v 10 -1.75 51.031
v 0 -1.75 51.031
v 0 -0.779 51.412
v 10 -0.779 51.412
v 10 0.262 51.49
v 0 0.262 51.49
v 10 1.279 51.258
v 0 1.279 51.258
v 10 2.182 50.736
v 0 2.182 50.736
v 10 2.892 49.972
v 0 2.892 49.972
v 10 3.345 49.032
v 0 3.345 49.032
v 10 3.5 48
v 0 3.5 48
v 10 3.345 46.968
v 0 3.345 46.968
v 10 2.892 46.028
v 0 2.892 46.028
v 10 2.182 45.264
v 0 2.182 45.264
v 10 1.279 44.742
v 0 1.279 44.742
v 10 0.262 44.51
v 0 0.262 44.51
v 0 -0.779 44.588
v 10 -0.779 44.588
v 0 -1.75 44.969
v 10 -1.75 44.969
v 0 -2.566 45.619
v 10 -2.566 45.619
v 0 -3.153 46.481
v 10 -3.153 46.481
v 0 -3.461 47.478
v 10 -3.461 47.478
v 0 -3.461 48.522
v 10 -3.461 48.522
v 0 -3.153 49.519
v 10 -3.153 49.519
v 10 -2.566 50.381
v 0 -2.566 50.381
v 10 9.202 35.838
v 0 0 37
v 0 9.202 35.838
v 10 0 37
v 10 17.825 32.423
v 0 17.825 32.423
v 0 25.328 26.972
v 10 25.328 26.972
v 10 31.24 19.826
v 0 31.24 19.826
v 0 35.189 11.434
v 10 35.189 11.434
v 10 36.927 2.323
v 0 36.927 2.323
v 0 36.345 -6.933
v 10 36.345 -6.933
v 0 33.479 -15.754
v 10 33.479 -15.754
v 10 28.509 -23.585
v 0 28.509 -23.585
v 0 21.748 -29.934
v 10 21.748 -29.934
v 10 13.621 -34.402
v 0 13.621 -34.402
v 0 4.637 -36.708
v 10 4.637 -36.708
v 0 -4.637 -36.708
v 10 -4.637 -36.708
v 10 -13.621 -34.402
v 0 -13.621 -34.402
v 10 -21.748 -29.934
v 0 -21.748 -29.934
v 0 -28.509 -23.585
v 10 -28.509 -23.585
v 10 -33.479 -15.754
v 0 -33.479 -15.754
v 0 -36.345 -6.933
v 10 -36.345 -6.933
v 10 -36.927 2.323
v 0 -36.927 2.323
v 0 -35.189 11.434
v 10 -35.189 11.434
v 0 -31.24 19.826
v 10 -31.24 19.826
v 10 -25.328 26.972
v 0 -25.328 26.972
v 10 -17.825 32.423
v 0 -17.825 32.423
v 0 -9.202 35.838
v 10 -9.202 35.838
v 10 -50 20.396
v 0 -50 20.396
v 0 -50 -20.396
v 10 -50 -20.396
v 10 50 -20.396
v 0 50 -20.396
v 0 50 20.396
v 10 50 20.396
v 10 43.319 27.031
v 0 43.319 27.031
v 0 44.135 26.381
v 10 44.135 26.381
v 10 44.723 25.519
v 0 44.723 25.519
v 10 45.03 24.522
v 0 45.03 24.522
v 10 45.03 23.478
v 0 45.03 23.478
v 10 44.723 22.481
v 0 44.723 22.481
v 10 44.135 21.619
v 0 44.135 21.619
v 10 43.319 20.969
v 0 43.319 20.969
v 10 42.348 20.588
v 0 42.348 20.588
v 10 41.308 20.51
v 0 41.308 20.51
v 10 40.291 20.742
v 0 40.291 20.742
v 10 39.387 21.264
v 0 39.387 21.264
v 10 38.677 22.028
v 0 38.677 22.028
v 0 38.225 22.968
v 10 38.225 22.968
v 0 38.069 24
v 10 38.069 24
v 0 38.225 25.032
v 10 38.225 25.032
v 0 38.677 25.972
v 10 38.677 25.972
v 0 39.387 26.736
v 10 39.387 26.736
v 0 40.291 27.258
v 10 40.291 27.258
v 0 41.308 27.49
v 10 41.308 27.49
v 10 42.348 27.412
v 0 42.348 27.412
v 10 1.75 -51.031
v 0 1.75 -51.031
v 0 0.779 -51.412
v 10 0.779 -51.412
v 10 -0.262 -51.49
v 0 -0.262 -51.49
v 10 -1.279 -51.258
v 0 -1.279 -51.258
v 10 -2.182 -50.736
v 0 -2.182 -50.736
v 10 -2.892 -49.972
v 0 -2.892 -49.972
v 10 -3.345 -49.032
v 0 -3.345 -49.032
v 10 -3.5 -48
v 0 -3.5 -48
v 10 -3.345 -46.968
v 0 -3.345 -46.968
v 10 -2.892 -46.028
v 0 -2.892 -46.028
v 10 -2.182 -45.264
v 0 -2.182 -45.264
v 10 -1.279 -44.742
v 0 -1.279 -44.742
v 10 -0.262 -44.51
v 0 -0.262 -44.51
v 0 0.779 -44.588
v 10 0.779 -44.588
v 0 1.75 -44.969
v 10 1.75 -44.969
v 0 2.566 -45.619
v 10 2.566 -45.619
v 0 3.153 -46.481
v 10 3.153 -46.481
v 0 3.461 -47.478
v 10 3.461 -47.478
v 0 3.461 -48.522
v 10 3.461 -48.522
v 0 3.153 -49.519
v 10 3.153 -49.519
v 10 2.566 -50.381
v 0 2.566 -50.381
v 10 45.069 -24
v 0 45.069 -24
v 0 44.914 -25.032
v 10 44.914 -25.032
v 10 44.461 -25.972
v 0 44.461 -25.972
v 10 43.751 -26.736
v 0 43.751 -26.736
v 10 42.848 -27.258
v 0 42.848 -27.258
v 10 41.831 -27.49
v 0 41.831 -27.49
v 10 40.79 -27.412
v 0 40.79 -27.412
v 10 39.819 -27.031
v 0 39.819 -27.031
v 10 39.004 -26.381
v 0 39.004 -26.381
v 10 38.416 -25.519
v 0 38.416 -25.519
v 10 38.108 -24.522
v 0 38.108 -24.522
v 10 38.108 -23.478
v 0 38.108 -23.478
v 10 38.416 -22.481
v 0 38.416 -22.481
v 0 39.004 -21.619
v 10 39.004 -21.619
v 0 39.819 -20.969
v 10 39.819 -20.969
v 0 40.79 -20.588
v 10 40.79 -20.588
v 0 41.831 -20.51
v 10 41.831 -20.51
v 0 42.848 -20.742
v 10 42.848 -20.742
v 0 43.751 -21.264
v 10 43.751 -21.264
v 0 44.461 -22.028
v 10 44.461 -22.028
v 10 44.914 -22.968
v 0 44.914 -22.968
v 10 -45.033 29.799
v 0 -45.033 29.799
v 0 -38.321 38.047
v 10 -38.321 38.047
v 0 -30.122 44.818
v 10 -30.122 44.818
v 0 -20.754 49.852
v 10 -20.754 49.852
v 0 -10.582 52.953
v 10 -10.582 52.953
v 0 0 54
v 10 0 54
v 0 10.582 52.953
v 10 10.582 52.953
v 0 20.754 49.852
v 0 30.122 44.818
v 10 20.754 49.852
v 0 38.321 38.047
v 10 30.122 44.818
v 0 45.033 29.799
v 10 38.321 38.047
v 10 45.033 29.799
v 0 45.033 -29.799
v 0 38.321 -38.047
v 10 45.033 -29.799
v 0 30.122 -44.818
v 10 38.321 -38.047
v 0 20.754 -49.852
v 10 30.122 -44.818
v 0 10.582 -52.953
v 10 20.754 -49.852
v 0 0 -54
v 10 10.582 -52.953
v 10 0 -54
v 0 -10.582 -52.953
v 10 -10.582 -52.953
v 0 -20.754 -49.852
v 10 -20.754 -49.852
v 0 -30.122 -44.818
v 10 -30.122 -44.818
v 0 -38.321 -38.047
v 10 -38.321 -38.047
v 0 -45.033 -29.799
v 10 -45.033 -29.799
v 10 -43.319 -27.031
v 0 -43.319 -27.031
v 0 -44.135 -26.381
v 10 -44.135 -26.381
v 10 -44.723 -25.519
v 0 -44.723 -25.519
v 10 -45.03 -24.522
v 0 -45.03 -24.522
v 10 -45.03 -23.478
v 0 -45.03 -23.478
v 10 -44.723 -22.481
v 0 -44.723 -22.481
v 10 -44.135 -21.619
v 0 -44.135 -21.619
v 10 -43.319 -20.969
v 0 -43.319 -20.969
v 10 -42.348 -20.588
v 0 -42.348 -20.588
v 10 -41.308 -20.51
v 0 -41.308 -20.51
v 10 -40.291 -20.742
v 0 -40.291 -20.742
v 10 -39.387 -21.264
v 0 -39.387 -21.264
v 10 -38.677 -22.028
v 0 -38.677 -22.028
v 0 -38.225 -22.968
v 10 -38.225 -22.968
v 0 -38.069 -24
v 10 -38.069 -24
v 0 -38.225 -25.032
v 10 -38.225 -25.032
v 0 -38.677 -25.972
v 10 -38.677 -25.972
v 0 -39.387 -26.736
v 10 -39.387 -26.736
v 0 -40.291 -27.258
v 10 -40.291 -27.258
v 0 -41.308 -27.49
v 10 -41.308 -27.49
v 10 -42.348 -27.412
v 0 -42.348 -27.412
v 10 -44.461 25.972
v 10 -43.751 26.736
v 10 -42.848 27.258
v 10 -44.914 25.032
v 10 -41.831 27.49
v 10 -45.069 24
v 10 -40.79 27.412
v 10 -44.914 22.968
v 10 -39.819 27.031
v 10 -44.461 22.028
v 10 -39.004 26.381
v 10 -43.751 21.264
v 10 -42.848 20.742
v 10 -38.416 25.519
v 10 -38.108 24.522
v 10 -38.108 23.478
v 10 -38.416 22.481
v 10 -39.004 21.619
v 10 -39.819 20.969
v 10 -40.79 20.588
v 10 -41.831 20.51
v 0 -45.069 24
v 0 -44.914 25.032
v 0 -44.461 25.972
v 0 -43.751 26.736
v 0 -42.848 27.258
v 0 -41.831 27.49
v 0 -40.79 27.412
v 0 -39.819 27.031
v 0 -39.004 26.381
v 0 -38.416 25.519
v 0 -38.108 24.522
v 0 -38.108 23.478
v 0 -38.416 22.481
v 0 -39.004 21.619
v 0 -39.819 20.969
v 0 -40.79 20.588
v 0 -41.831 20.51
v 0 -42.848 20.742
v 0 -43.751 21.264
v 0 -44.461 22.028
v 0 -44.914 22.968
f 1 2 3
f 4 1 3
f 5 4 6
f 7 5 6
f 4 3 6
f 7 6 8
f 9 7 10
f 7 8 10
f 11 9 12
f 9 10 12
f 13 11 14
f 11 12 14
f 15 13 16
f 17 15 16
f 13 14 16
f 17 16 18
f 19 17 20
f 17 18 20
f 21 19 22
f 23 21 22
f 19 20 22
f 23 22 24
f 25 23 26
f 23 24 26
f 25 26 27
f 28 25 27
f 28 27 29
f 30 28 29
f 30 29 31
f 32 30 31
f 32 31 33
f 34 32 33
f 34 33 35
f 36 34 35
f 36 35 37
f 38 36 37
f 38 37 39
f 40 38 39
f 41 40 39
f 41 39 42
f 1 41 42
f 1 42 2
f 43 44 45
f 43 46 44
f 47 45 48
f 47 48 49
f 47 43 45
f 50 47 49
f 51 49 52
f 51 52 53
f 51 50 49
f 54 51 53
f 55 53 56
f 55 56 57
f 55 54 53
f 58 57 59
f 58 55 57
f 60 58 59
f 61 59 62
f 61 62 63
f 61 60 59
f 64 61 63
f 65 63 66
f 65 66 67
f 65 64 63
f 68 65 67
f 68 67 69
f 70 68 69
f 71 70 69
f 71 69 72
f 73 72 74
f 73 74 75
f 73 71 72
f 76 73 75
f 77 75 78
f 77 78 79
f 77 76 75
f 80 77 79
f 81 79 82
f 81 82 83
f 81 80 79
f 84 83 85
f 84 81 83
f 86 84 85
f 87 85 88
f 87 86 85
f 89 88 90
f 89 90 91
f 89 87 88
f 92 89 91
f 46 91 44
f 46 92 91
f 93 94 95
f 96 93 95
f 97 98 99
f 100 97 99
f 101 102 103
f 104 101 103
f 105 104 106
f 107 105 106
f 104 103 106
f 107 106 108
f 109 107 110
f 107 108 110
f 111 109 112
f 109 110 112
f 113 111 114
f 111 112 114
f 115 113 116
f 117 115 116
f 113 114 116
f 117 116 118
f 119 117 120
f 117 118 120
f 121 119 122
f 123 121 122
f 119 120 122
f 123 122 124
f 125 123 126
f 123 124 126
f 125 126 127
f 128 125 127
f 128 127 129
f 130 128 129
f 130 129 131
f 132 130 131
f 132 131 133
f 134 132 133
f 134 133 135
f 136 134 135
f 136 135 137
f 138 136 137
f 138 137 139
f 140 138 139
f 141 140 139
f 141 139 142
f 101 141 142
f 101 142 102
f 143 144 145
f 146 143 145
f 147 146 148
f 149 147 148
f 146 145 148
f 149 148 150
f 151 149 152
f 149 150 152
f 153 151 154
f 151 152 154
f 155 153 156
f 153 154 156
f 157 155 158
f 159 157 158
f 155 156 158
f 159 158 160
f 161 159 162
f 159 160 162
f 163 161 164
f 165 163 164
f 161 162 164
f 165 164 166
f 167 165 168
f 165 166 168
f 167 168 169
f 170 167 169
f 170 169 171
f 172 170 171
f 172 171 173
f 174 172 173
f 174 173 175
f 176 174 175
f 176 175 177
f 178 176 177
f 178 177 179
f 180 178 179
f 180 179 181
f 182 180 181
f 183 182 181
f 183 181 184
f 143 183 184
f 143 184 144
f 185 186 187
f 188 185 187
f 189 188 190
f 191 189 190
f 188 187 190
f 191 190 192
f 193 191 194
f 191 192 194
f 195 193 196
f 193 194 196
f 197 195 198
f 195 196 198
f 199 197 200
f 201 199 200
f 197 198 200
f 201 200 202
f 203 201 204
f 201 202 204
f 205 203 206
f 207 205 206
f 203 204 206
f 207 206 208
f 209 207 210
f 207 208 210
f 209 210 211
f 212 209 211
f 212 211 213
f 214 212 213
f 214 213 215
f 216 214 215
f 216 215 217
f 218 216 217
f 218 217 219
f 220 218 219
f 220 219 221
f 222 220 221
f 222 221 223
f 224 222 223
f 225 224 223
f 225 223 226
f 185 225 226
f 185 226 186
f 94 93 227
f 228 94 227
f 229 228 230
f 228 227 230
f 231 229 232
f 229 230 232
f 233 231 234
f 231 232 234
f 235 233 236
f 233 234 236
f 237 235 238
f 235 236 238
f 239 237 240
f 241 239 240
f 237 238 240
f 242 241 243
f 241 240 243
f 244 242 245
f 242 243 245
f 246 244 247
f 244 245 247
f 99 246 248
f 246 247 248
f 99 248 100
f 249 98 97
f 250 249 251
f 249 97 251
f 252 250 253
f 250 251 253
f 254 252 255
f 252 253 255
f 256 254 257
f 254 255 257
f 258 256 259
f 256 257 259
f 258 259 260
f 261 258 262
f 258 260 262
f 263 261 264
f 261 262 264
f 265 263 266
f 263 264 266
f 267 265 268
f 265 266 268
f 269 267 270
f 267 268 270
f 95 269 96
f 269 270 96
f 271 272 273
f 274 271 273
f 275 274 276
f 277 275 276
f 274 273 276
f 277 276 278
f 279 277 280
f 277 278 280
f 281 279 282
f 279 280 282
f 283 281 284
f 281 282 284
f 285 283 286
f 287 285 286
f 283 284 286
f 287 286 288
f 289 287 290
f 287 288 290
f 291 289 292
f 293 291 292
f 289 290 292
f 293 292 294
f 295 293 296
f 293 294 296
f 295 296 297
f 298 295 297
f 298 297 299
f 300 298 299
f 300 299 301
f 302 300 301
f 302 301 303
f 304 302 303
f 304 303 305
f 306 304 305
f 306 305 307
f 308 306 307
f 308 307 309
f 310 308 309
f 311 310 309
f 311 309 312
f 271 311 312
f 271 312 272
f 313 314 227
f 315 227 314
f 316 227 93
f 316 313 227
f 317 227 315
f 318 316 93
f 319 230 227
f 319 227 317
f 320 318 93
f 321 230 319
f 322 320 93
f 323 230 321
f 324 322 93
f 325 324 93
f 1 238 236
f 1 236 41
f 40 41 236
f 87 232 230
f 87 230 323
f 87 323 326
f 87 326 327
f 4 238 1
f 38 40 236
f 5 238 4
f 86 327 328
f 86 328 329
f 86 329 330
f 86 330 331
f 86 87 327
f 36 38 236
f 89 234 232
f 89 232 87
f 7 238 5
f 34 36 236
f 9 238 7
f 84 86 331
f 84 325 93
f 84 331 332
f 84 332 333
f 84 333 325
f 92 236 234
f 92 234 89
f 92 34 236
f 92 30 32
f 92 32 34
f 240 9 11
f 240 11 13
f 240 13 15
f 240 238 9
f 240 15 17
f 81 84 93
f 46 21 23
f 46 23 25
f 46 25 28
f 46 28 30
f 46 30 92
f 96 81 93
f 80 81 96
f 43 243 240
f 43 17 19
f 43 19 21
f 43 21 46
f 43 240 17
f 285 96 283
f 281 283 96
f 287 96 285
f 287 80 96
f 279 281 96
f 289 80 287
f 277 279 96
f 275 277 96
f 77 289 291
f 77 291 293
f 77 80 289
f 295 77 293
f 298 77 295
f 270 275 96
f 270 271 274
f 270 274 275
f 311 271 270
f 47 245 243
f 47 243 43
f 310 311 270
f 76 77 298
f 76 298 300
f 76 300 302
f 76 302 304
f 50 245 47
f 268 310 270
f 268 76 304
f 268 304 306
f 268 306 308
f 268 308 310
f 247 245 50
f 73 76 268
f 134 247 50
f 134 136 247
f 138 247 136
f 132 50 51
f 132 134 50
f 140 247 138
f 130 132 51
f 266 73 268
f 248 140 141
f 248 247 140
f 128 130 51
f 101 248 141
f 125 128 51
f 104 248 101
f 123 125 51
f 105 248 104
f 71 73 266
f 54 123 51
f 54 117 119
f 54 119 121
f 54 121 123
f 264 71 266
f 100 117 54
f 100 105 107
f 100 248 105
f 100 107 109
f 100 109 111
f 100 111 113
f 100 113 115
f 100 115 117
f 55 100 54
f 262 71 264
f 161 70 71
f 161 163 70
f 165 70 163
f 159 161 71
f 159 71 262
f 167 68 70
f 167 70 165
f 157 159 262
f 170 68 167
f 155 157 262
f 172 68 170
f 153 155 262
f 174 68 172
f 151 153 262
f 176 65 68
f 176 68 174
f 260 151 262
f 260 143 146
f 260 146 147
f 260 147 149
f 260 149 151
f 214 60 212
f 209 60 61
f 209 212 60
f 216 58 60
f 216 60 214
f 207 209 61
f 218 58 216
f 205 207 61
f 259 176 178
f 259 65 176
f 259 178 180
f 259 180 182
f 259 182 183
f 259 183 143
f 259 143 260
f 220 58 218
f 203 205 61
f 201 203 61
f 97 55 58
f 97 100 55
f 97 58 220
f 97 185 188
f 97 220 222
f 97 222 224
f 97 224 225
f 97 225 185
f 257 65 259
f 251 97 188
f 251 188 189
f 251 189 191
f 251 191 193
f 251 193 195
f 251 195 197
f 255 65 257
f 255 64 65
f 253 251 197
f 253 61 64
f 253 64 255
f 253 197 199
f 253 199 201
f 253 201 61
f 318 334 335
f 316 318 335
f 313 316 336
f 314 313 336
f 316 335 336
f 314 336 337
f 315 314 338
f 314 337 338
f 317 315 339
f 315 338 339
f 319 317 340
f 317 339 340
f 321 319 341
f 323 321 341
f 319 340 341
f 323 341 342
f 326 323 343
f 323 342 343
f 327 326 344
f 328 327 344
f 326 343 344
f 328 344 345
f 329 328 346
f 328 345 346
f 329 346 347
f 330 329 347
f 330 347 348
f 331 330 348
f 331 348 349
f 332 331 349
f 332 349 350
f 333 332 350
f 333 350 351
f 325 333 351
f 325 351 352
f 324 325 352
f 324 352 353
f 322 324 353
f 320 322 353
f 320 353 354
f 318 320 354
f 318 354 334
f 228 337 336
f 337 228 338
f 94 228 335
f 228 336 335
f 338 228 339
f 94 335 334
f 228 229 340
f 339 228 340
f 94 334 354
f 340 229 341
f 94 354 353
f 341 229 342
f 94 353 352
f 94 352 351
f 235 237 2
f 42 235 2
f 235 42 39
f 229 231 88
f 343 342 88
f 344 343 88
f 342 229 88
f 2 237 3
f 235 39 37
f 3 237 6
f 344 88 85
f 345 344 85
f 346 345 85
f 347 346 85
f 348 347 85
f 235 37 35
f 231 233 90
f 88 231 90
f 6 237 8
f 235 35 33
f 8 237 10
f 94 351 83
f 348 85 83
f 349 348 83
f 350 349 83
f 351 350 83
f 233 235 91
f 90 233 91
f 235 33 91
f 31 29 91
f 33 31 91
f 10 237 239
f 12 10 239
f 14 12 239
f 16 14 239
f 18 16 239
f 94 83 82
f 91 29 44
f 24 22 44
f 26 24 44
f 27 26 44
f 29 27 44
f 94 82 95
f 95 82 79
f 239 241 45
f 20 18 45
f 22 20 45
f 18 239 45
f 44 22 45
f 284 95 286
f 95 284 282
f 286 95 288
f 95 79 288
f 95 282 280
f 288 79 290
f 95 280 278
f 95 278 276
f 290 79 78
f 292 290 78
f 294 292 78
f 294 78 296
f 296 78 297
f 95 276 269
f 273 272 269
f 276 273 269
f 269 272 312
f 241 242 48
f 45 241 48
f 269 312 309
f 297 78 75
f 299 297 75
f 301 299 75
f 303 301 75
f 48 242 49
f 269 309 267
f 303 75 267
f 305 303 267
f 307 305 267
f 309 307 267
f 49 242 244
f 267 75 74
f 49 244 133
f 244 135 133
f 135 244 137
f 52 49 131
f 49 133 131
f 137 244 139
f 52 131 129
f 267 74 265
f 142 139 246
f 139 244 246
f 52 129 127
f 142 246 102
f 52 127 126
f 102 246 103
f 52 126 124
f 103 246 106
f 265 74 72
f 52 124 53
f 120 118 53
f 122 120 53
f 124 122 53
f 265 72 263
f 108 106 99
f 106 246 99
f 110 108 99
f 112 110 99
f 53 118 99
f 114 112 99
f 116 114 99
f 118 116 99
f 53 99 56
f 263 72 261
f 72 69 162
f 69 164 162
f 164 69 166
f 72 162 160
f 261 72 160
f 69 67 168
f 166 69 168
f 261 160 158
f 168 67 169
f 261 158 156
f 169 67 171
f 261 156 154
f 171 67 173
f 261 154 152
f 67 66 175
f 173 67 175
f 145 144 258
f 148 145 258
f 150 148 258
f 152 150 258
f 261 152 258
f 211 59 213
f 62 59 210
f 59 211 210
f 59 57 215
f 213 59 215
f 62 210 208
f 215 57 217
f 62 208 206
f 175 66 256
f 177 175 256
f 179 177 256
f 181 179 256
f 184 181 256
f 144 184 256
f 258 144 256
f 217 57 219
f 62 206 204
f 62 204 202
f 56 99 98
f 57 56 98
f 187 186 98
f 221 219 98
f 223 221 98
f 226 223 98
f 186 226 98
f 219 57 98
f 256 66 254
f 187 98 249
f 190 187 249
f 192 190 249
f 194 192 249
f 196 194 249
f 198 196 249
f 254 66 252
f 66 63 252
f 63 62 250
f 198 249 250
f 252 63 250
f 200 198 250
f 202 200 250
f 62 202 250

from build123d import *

# Parameters (mm, degrees)
F0_W            = 10
F0_H            = 17
F2_R            = 3.5
F3_DEPTH        = 10.001
F3_COPIES_COUNT = 6
F5_DEPTH        = 10.001


# Not quite as in the source:
# - a pattern or mirror of a feature is missing from the dataset's text; its kind, count and spacing are read off the source's solid


with BuildPart() as f1:
    # F0 (on Front) → F1 (revolve)
    with BuildSketch(Plane.XZ):
        with Locations((5, 45.5)):
            Rectangle(F0_W, F0_H)
    revolve(axis=Axis((-28.7704151153, 0, 0), (-1, 0, 0)))

    # F2 (on face) → F3 (cut, through all)
    with BuildSketch(Plane(origin=(0, 0, 0), x_dir=(0, -1, 0), z_dir=(-1, 0, 0))):
        with Locations((41.5692193817, 24)):
            Circle(F2_R)
    f3 = extrude(amount=-F3_DEPTH, mode=Mode.SUBTRACT)

    # F3_copies: F3 ×6 about axis
    f3_copies_axis = Axis((0, 0, 0), (1, 0, 0))
    for i in range(1, F3_COPIES_COUNT):
        add(f3.rotate(f3_copies_axis, i * 360 / F3_COPIES_COUNT), mode=Mode.SUBTRACT)

    # F4 (on face) → F5 (cut, through all)
    with BuildSketch(Plane(origin=(0, 0, 0), x_dir=(0, -1, 0), z_dir=(-1, 0, 0))):
        with BuildLine():
            Line((-50, -20.3960780544), (-50, 20.3960780544))
            ThreePointArc((-50, 20.3960780544), (-54, 0), (-50, -20.3960780544))
        make_face()
        with BuildLine():
            ThreePointArc((54, 0), (52.990565198, 10.3923048454), (50, 20.3960780544))
            Line((50, 20.3960780544), (50, -20.3960780544))
            ThreePointArc((50, -20.3960780544), (52.990565198, -10.3923048454), (54, 0))
        make_face()
    extrude(amount=-F5_DEPTH, mode=Mode.SUBTRACT)


solid = f1.part
